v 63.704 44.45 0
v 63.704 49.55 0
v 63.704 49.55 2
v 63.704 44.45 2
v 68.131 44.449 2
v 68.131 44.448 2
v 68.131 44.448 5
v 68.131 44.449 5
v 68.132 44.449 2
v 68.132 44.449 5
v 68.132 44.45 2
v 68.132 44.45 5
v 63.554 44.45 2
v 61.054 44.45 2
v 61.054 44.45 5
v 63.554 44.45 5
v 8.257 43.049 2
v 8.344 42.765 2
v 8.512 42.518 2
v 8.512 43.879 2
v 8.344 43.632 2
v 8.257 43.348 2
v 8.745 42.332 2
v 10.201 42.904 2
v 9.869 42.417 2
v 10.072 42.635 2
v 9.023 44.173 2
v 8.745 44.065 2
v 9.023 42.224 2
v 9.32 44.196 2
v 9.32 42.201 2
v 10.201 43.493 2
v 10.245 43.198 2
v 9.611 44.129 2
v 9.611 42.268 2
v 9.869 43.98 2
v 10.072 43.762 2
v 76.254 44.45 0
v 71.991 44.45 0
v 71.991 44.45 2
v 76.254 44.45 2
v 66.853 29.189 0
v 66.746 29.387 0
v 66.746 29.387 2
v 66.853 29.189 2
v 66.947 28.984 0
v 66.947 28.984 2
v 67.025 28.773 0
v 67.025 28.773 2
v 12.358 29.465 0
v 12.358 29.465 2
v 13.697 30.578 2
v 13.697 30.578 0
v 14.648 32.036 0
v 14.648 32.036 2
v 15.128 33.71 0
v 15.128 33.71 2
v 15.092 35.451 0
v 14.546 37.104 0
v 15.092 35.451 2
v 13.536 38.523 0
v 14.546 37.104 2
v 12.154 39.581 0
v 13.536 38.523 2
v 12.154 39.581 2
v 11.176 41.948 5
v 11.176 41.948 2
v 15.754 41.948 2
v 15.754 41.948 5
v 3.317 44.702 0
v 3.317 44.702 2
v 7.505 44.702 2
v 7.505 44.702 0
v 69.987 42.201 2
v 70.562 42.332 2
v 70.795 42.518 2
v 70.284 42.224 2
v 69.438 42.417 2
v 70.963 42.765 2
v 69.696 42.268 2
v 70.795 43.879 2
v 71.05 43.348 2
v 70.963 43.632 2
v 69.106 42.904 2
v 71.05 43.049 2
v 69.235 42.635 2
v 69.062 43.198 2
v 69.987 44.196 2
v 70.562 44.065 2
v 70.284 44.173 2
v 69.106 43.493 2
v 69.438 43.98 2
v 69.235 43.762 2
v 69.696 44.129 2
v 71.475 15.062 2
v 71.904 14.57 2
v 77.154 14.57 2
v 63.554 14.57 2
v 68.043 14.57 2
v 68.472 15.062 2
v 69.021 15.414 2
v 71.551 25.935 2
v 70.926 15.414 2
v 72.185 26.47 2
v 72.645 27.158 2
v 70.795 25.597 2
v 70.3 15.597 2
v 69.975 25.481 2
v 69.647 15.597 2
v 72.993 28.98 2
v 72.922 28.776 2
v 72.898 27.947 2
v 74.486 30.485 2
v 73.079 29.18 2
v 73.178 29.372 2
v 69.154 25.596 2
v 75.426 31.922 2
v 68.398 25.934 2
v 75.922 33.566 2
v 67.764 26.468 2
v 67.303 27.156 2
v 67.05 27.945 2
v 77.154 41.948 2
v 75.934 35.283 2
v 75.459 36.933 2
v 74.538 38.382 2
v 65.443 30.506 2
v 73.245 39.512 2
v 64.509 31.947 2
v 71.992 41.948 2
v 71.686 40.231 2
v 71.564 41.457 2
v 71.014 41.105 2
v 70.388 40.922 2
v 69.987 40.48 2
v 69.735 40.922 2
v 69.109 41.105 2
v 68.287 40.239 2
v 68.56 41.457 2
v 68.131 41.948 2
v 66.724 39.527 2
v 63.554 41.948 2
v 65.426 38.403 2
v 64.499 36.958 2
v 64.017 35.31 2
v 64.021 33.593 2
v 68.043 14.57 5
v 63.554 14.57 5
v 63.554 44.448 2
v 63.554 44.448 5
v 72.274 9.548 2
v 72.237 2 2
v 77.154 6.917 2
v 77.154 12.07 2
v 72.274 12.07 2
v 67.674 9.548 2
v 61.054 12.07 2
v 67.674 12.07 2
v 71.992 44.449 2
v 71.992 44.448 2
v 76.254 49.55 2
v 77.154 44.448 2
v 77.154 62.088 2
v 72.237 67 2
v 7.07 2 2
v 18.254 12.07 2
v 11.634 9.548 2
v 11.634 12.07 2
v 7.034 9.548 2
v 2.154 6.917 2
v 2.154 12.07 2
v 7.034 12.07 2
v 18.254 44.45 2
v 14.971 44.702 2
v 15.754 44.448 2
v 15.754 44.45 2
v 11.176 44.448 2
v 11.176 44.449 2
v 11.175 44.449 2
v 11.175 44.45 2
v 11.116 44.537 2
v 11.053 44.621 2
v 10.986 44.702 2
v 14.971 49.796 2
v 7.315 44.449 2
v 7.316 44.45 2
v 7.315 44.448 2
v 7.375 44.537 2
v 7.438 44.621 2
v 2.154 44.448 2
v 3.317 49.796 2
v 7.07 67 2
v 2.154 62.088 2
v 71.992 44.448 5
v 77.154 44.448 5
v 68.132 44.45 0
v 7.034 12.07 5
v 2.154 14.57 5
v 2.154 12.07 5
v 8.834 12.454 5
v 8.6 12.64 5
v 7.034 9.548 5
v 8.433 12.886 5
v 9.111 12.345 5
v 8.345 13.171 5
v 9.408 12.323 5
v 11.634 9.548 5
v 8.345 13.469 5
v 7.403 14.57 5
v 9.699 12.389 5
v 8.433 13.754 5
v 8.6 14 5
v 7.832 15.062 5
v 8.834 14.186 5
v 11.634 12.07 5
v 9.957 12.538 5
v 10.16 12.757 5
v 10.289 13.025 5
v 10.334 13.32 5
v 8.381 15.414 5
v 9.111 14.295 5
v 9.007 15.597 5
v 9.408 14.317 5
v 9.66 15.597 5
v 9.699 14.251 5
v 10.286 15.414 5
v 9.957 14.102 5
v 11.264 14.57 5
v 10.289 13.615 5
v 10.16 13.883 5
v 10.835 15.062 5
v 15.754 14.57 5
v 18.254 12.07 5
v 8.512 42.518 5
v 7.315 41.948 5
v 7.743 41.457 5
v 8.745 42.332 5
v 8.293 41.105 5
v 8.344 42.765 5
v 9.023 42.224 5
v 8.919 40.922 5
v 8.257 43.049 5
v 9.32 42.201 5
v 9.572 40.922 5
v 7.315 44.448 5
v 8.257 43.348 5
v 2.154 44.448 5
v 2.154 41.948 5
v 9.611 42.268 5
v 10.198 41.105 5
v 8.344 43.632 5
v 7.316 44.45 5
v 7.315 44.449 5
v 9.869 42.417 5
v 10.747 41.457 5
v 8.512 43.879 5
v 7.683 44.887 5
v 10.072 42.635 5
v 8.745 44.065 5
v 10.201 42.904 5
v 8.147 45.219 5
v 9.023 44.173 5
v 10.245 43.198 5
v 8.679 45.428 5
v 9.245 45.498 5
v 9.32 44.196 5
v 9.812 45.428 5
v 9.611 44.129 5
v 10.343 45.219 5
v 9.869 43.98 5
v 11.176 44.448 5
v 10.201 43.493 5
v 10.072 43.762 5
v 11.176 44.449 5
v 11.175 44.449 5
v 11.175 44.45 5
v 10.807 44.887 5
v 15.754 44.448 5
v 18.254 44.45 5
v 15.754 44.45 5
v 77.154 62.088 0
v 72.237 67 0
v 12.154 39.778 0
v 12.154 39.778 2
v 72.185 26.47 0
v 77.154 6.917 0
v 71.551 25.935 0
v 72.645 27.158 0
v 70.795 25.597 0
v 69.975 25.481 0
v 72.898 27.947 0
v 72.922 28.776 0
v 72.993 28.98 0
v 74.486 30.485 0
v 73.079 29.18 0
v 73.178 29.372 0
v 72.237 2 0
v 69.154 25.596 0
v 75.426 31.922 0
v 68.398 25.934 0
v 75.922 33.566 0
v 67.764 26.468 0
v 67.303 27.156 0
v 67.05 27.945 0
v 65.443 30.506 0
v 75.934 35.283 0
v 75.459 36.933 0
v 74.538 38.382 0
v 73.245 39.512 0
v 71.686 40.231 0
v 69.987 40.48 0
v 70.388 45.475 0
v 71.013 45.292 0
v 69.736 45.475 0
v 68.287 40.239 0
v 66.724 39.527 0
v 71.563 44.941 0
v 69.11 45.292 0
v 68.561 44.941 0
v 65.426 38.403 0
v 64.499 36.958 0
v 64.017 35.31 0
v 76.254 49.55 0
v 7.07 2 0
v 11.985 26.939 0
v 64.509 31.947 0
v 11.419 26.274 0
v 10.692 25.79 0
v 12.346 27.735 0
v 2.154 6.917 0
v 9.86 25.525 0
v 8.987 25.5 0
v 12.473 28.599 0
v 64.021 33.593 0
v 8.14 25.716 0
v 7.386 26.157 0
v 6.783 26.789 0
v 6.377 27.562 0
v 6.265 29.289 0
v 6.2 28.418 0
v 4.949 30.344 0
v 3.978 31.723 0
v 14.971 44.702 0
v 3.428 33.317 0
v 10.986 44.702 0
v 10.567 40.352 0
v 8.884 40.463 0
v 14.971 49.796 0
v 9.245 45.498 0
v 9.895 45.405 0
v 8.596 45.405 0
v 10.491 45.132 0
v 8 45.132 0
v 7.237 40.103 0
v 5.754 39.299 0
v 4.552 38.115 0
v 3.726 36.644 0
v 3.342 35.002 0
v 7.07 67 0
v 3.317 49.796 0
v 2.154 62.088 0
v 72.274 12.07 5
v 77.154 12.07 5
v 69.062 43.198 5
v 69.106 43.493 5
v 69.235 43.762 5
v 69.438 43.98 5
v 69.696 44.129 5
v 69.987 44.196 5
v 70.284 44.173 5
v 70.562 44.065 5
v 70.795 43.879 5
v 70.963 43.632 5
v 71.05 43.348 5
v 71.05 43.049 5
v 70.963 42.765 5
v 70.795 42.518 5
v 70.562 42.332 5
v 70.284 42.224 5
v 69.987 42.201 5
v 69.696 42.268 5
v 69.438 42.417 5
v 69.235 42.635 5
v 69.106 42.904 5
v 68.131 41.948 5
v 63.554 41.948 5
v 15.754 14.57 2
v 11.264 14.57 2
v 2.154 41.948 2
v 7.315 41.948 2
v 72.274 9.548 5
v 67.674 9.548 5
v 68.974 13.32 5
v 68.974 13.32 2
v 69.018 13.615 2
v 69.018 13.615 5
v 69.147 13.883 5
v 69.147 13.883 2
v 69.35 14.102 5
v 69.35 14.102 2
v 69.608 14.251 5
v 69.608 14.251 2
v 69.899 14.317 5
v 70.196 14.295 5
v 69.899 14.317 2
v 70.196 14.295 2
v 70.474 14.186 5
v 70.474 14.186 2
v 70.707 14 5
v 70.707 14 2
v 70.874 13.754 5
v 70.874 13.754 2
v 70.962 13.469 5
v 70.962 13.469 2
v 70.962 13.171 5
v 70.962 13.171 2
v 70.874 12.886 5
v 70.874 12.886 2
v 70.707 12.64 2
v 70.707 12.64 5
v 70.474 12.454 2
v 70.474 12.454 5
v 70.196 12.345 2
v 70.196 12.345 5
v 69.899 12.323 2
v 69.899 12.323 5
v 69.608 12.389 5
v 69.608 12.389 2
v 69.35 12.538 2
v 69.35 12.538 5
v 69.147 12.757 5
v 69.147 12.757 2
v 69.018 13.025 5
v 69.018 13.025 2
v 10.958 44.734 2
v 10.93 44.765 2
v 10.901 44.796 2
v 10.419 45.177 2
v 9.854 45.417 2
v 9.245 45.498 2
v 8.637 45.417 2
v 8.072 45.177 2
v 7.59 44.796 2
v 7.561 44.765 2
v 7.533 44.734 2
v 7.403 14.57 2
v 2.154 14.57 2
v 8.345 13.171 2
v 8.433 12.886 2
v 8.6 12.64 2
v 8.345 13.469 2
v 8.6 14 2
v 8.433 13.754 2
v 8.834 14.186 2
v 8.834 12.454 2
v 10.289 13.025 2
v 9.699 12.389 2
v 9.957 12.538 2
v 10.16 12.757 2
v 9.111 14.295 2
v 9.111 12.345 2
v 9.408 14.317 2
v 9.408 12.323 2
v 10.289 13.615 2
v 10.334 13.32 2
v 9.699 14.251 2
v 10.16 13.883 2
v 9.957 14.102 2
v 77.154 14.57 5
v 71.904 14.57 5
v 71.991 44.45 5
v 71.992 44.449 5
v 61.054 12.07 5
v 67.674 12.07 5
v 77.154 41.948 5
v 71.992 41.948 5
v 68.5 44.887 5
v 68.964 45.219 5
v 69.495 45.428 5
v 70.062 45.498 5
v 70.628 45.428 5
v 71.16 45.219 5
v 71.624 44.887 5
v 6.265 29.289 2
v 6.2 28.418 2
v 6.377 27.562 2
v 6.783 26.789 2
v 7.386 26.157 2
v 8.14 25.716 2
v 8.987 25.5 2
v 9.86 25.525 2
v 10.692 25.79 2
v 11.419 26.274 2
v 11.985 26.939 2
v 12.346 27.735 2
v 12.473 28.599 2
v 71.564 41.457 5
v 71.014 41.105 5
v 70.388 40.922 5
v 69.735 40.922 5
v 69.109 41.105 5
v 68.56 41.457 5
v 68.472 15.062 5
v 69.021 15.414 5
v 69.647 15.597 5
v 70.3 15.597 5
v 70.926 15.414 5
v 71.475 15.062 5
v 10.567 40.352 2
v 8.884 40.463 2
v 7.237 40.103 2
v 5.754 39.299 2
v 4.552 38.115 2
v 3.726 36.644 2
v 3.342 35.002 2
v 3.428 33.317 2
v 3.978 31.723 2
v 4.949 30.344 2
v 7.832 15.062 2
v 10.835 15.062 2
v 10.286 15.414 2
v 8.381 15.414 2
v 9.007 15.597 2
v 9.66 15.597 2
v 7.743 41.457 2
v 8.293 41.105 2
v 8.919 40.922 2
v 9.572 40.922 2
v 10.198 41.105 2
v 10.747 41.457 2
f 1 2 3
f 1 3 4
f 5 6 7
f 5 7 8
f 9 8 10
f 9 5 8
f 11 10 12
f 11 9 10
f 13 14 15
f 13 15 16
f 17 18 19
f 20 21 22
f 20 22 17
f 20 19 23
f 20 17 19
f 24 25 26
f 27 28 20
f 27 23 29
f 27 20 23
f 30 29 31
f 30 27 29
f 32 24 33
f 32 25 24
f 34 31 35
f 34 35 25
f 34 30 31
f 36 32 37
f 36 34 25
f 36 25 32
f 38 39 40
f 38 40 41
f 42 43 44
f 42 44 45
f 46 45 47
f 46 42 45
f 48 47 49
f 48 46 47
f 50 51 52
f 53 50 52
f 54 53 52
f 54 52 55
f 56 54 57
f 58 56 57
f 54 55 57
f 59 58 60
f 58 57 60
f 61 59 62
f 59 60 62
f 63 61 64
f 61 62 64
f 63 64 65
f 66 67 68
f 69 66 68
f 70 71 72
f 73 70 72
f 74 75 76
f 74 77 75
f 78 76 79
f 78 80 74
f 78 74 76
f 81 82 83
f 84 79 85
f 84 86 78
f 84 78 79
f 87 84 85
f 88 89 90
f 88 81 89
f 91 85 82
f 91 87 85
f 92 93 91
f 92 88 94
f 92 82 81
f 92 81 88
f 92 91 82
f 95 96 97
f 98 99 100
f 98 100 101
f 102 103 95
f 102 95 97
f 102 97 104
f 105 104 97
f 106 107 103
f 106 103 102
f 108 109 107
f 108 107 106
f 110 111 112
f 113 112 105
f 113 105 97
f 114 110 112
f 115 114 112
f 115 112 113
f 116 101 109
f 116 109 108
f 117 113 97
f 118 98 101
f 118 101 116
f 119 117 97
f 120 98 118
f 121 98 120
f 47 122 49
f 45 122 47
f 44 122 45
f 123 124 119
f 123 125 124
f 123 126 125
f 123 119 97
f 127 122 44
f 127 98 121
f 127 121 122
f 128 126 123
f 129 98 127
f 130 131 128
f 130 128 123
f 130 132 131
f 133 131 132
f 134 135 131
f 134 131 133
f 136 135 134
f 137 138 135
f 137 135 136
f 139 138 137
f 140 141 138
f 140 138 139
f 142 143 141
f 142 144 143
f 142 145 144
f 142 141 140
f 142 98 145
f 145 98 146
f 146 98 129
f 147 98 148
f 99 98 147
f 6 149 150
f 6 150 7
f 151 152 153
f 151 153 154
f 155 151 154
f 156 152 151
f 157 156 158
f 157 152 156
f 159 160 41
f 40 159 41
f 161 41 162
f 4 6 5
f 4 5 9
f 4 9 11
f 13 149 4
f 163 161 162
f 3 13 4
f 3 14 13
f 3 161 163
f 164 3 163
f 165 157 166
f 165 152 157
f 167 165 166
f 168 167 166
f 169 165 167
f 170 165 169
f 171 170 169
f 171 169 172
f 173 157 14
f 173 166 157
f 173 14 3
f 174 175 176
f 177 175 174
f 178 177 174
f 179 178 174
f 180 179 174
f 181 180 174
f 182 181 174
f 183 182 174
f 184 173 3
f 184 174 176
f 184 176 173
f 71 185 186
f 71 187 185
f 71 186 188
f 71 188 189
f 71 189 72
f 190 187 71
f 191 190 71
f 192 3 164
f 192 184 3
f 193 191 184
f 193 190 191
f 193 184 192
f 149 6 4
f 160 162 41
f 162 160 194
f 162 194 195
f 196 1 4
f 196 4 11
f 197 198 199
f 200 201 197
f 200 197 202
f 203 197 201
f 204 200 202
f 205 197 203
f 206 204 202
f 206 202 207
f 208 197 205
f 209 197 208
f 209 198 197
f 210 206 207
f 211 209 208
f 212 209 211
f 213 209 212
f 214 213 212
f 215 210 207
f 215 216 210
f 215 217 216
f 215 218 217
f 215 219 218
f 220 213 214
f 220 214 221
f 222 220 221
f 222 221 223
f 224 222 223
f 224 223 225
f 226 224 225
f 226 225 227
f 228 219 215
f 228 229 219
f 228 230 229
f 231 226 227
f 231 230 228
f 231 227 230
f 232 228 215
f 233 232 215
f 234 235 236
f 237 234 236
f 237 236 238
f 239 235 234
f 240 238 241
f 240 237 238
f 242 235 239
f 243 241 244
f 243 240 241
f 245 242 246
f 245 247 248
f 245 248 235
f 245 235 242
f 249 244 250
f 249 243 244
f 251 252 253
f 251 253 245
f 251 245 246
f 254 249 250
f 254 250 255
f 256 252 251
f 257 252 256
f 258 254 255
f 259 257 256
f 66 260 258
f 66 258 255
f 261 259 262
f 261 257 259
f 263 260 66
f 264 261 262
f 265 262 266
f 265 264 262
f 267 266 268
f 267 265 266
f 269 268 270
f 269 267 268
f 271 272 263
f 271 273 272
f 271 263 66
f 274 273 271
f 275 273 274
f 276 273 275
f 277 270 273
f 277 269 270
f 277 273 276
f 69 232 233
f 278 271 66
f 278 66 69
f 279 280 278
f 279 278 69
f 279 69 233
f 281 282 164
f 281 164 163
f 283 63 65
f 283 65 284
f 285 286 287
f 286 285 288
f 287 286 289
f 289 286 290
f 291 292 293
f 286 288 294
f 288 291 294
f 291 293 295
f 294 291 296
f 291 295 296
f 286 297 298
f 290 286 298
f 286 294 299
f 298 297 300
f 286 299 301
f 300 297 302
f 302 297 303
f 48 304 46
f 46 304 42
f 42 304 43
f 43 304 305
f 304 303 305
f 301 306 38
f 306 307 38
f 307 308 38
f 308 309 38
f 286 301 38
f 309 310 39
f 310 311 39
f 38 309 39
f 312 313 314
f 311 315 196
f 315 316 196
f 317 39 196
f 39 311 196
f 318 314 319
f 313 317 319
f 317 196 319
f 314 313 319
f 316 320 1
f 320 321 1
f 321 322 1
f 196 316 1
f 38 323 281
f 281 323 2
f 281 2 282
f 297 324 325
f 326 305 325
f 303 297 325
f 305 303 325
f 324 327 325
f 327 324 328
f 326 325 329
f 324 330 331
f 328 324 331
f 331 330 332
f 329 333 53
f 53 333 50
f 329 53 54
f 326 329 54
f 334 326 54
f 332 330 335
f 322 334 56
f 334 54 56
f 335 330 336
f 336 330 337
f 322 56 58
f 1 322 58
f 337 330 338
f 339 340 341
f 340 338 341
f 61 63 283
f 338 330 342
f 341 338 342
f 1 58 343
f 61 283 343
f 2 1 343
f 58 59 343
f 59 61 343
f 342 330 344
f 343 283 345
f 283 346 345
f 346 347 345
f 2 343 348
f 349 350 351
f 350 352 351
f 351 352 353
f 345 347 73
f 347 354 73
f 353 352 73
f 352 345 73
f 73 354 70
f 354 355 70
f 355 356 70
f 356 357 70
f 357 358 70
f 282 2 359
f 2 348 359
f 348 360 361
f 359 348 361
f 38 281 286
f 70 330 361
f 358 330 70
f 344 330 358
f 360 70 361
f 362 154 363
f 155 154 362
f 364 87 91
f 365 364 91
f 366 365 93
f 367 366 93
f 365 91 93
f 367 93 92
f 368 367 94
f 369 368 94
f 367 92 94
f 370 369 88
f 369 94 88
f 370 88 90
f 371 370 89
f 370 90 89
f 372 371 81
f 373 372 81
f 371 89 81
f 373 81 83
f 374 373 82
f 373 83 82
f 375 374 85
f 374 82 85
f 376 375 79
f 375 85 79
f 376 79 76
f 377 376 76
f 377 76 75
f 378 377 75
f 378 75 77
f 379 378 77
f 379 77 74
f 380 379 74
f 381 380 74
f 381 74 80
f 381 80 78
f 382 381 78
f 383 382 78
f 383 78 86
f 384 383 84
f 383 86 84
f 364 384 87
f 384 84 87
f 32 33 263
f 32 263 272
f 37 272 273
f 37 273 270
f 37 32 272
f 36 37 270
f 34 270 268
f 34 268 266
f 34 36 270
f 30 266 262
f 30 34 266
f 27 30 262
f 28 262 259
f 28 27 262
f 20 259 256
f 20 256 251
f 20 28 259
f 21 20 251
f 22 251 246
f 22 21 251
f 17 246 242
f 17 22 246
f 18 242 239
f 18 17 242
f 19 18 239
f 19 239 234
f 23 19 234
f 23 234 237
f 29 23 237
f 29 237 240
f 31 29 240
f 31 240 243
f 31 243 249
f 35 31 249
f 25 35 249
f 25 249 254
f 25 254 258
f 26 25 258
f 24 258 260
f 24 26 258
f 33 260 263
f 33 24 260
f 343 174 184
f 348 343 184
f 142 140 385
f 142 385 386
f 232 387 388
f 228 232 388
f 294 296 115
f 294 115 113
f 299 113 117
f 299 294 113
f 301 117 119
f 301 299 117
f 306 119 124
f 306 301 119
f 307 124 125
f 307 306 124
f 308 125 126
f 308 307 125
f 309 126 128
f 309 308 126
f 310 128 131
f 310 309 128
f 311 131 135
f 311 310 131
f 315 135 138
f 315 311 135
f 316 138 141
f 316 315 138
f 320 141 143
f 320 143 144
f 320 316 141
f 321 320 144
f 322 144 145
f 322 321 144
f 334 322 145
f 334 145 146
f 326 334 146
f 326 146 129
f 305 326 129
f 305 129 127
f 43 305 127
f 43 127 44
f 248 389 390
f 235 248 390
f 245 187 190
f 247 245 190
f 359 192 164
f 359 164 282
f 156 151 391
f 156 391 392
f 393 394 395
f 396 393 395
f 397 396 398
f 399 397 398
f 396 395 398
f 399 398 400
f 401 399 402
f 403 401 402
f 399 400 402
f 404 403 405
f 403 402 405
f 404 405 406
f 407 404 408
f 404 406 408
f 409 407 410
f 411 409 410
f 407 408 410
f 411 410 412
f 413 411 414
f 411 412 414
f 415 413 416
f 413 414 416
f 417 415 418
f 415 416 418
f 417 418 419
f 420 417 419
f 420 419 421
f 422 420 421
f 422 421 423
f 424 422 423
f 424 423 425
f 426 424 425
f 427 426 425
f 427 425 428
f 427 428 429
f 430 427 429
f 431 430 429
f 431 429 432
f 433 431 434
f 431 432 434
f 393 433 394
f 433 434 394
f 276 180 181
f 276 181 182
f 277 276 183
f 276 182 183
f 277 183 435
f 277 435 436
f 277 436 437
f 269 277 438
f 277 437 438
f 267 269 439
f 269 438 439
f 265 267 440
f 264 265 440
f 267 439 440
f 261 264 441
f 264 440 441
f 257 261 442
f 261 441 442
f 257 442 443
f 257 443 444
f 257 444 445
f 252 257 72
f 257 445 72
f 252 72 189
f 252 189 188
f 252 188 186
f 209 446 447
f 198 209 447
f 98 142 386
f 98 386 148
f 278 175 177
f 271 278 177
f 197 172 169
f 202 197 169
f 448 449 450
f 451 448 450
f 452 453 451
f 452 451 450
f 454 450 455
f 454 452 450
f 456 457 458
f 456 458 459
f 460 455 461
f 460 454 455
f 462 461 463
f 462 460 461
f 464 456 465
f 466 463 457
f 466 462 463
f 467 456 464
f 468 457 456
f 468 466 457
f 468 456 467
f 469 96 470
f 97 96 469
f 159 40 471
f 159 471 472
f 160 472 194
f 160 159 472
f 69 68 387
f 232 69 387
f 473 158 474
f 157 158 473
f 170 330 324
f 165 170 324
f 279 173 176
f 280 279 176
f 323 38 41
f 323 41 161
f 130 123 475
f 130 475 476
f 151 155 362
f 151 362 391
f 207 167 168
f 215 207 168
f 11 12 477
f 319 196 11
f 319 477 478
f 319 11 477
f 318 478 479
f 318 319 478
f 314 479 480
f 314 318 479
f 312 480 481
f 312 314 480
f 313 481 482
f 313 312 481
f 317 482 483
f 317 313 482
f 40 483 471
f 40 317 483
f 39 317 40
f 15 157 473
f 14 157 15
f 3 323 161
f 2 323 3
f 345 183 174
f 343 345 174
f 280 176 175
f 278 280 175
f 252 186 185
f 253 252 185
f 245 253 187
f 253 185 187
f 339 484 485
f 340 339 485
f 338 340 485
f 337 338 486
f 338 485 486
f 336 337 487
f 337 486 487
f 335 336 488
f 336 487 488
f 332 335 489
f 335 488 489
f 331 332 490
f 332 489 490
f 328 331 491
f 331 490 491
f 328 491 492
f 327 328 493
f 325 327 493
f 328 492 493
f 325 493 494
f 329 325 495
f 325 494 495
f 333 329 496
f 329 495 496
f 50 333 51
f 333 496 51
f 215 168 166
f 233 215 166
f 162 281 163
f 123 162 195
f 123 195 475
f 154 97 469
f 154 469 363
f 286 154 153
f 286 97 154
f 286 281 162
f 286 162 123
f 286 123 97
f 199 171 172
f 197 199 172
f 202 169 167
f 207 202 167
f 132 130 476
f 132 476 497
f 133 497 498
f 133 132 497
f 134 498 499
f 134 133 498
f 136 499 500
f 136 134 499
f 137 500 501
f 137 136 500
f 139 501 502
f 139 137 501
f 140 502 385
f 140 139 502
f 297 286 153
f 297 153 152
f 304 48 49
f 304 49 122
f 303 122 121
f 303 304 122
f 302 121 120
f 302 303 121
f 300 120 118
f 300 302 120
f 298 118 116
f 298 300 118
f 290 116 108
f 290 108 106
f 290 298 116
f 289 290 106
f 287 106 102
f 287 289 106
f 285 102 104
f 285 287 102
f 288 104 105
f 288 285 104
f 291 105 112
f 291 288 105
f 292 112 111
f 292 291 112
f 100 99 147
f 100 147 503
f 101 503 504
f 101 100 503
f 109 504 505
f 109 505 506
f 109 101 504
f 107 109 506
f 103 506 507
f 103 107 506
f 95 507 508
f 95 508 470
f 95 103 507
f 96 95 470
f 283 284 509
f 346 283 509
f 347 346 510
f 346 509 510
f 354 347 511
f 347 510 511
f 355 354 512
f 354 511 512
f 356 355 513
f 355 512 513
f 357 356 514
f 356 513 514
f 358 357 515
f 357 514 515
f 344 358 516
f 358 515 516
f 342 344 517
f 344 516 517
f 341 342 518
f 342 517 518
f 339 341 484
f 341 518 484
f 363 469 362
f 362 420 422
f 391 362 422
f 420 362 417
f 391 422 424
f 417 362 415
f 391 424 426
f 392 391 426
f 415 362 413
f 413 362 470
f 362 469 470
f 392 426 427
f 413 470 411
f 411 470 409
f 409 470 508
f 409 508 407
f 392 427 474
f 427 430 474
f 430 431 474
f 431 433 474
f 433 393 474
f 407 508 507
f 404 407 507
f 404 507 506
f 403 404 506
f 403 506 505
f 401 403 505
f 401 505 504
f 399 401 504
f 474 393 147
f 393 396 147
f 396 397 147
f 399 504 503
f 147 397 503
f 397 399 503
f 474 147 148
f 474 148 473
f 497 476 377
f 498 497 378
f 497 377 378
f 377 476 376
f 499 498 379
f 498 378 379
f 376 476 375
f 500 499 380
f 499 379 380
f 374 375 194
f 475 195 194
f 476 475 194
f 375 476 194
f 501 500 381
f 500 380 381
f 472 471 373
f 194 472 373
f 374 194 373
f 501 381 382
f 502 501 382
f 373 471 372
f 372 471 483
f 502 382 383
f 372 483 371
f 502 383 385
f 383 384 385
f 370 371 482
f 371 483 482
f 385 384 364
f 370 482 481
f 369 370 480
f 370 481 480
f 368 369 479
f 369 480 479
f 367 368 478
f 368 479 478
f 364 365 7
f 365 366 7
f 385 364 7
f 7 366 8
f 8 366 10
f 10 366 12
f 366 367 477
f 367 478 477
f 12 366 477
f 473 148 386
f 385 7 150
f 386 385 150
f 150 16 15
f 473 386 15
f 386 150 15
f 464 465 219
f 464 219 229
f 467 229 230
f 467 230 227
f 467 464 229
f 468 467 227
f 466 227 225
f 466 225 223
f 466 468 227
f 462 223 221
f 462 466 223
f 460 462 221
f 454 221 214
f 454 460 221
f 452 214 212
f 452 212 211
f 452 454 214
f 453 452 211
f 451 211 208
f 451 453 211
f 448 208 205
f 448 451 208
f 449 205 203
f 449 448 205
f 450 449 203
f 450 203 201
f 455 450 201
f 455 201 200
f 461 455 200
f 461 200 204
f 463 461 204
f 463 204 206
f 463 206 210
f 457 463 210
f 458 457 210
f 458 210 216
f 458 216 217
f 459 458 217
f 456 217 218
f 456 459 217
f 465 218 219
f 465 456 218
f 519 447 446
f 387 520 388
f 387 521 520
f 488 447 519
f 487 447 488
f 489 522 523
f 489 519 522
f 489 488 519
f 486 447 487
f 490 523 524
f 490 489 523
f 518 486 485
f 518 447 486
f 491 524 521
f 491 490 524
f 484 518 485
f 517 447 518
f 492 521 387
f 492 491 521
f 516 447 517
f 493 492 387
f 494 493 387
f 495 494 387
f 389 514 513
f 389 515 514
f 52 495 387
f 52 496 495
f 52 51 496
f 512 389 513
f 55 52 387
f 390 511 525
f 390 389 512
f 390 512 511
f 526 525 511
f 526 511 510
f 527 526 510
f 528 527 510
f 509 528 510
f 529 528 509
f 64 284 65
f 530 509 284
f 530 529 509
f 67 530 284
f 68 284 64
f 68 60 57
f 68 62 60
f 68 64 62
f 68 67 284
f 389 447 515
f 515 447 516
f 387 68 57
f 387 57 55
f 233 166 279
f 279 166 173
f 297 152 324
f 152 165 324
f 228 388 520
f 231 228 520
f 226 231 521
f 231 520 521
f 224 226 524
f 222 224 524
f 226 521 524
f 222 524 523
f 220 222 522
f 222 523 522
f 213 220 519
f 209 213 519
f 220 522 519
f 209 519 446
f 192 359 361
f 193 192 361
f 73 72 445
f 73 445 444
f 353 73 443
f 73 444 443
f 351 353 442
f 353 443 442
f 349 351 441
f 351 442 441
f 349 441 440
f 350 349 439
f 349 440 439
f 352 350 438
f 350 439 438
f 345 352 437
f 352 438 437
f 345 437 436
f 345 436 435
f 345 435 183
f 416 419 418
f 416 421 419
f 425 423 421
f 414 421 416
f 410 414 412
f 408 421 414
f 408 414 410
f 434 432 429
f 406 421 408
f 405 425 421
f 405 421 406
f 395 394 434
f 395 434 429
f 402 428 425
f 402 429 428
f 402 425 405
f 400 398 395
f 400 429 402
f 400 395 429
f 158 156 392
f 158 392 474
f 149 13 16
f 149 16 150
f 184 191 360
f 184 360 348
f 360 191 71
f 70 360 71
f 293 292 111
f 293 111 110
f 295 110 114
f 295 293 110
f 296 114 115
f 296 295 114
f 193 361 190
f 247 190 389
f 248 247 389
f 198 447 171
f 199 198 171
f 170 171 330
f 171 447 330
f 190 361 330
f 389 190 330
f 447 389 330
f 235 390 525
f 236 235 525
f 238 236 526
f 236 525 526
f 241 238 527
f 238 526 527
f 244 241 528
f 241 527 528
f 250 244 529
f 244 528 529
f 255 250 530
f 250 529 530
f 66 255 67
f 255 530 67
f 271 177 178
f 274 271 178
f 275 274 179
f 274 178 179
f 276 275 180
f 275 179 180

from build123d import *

# Parameters (mm, degrees)
BOSS_EXTRUDE3_DEPTH = 2
SKETCH7_R           = 1
SKETCH7_W           = 2.5
SKETCH7_H           = 2.5
BOSS_EXTRUDE5_DEPTH = 3
SKETCH15_R          = 6.016109345
SKETCH15_R_2        = 2.966709341
CUT_EXTRUDE5_DEPTH  = 3
CUT_EXTRUDE6_DEPTH  = 3
CUT_EXTRUDE7_DEPTH  = 10
SKETCH30_W          = 2
SKETCH30_H          = 65
BOSS_EXTRUDE6_DEPTH = 5
SKETCH31_R          = 3.139995771
SKETCH31_R_2        = 5.842822915
CUT_EXTRUDE8_DEPTH  = 5
SKETCH33_W          = 2.81704287
SKETCH33_H          = 5.093792668
CUT_EXTRUDE9_DEPTH  = 5


with BuildPart() as part:
    # Sketch2 → Boss-Extrude3 (new body)
    with BuildSketch(Plane.XY):
        Polygon((62.078732257, 67), (7.070378023, 67), (2.153513577, 62.087886246), (2.153513577, 6.916864445), (7.070378023, 2), (62.078732257, 2), (67.153513577, 7.083274694), (67.153513577, 61.921636784), align=None)
        with BuildLine():
            ThreePointArc((12.561398281, 29.386897281), (12.405099811, 29.087669445), (12.28230409, 28.773205265))
            ThreePointArc((12.28230409, 28.773205265), (9.332354964, 25.48092154), (6.384978263, 28.775508397))
            ThreePointArc((6.384978263, 28.775508397), (6.272687262, 29.080787813), (6.128559615, 29.372390302))
            ThreePointArc((6.128559615, 29.372390302), (9.319946418, 40.479834047), (12.561398281, 29.386897281))
        make_face(mode=Mode.SUBTRACT)
        with BuildLine():
            Line((7.315683042, 44.45), (3.053513577, 44.45))
            Line((3.053513577, 44.45), (3.053513577, 49.55))
            Line((3.053513577, 49.55), (15.603513577, 49.55))
            Line((15.603513577, 49.55), (15.603513577, 44.45))
            Line((15.603513577, 44.45), (11.175073004, 44.45))
            ThreePointArc((11.175073004, 44.45), (9.245378023, 45.49849), (7.315683042, 44.45))
        make_face(mode=Mode.SUBTRACT)
    boss_extrude3 = extrude(amount=BOSS_EXTRUDE3_DEPTH)

    # Sketch7 → Boss-Extrude5 (add)
    with BuildSketch(Plane.XY.offset(2)):
        with BuildLine():
            Line((15.753513577, 14.57), (11.264187035, 14.57))
            ThreePointArc((11.264187035, 14.57), (9.333513577, 15.62), (7.40284012, 14.57))
            Line((7.40284012, 14.57), (2.153513577, 14.57))
            Line((2.153513577, 14.57), (2.153513577, 12.07))
            Line((2.153513577, 12.07), (7.033513577, 12.07))
            Line((7.033513577, 12.07), (7.40284012, 12.07))
            ThreePointArc((7.40284012, 12.07), (9.333513577, 11.02), (11.264187035, 12.07))
            Line((11.264187035, 12.07), (11.633513577, 12.07))
            Line((11.633513577, 12.07), (15.753513577, 12.07))
            Line((15.753513577, 12.07), (15.753513577, 14.57))
        make_face()
        with Locations((9.333513577, 13.32)):
            Circle(SKETCH7_R, mode=Mode.SUBTRACT)
        with BuildLine():
            Line((11.633513577, 9.547776159), (11.633513577, 12.07))
            Line((11.633513577, 12.07), (11.264187035, 12.07))
            ThreePointArc((11.264187035, 12.07), (9.333513577, 11.02), (7.40284012, 12.07))
            Line((7.40284012, 12.07), (7.033513577, 12.07))
            Line((7.033513577, 12.07), (7.033513577, 9.547776159))
            Line((7.033513577, 9.547776159), (11.633513577, 9.547776159))
        make_face()
        with Locations((17.003513577, 13.32)):
            Rectangle(SKETCH7_W, SKETCH7_H)
        with BuildLine():
            Line((15.753513577, 16.534568208), (15.753513577, 14.57))
            Line((15.753513577, 14.57), (18.253513577, 14.57))
            Line((18.253513577, 14.57), (18.253513577, 16.534568208))
            Line((18.253513577, 16.534568208), (18.253513577, 44.45))
            Line((18.253513577, 44.45), (15.753513577, 44.45))
            Line((15.753513577, 44.45), (15.753513577, 44.44849))
            Line((15.753513577, 44.44849), (11.17605148, 44.44849))
            ThreePointArc((11.17605148, 44.44849), (11.17556239, 44.449245096), (11.175073004, 44.45))
            ThreePointArc((11.175073004, 44.45), (10.343450652, 45.219439406), (9.245378023, 45.49849))
            ThreePointArc((9.245378023, 45.49849), (8.147305393, 45.219439406), (7.315683042, 44.45))
            ThreePointArc((7.315683042, 44.45), (7.315193656, 44.449245096), (7.314704565, 44.44849))
            Line((7.314704565, 44.44849), (2.153513577, 44.44849))
            Line((2.153513577, 44.44849), (2.153513577, 41.94849))
            Line((2.153513577, 41.94849), (7.314704565, 41.94849))
            ThreePointArc((7.314704565, 41.94849), (9.245378023, 40.89849), (11.17605148, 41.94849))
            Line((11.17605148, 41.94849), (15.753513577, 41.94849))
            Line((15.753513577, 41.94849), (15.753513577, 16.534568208))
        make_face()
        with Locations((9.245378023, 43.19849)):
            Circle(SKETCH7_R, mode=Mode.SUBTRACT)
    boss_extrude5 = extrude(amount=BOSS_EXTRUDE5_DEPTH)

    # Mirror4: Boss-Extrude3, Boss-Extrude5 across plane
    add(boss_extrude3.mirror(Plane.ZY.offset(-34.653513577)))
    add(boss_extrude5.mirror(Plane.ZY.offset(-34.653513577)))

    # Sketch15 → Cut-Extrude5 (cut)
    with BuildSketch(Plane.XY.offset(2)):
        with Locations((9.333513577, 34.46374)):
            Circle(SKETCH15_R)
        with Locations((9.333513577, 28.447630655)):
            Circle(SKETCH15_R_2)
    cut_extrude5 = extrude(amount=-CUT_EXTRUDE5_DEPTH, mode=Mode.SUBTRACT)

    # Sketch21 → Cut-Extrude6 (cut)
    with BuildSketch(Plane.XY.offset(2)):
        with BuildLine():
            Line((3.317404233, 44.701735967), (7.504616246, 44.701735967))
            ThreePointArc((7.504616246, 44.701735967), (9.245378023, 45.49849), (10.986139799, 44.701735967))
            Line((10.986139799, 44.701735967), (15.349622922, 44.701735967))
            Line((15.349622922, 44.701735967), (15.349622922, 49.701735967))
            Line((15.349622922, 49.701735967), (3.317404233, 49.701735967))
            Line((3.317404233, 49.701735967), (3.317404233, 44.701735967))
        make_face()
    extrude(amount=-CUT_EXTRUDE6_DEPTH, mode=Mode.SUBTRACT)

    # Sketch29 → Cut-Extrude7 (cut)
    with BuildSketch(Plane.XY.offset(2)):
        with BuildLine():
            Line((3.317404233, 44.795528635), (7.590244313, 44.795528635))
            ThreePointArc((7.590244313, 44.795528635), (9.245378023, 45.49849), (10.900511733, 44.795528635))
            Line((10.900511733, 44.795528635), (15.349622922, 44.795528635))
            Line((15.349622922, 44.795528635), (15.349622922, 49.795528635))
            Line((15.349622922, 49.795528635), (3.317404233, 49.795528635))
            Line((3.317404233, 49.795528635), (3.317404233, 44.795528635))
        make_face()
    cut_extrude7 = extrude(amount=-CUT_EXTRUDE7_DEPTH, mode=Mode.SUBTRACT)

    # Mirror9: Cut-Extrude7 across plane
    add(cut_extrude7.mirror(Plane.ZY.offset(-34.653513577)), mode=Mode.SUBTRACT)

    # Mirror5: Cut-Extrude5 across plane
    add(cut_extrude5.mirror(Plane.ZY.offset(-34.653513577)), mode=Mode.SUBTRACT)

    # SurfaceCut1
    split(bisect_by=Plane.ZY.offset(-34.653513577), keep=Keep.TOP)

    # Sketch30 → Boss-Extrude6 (add)
    with BuildSketch(Plane(origin=(34.653513577, 0, 0), x_dir=(0, 0, -1), z_dir=(1, 0, 0))):
        with Locations((-1, 34.5)):
            Rectangle(SKETCH30_W, SKETCH30_H)
    extrude(amount=BOSS_EXTRUDE6_DEPTH)

    # Mirror12: Boss-Extrude3, Boss-Extrude5 across plane
    add(boss_extrude3.mirror(Plane(origin=(39.653513577, 0, 0), x_dir=(0, 0, 1), z_dir=(1, 0, 0))))
    add(boss_extrude5.mirror(Plane(origin=(39.653513577, 0, 0), x_dir=(0, 0, 1), z_dir=(1, 0, 0))))

    # Sketch31 → Cut-Extrude8 (cut)
    with BuildSketch(Plane.XY.offset(2)):
        with Locations((9.333513577, 28.620917085)):
            Circle(SKETCH31_R)
        with Locations((9.333513577, 34.46374)):
            Circle(SKETCH31_R_2)
    extrude(amount=-CUT_EXTRUDE8_DEPTH, mode=Mode.SUBTRACT)

    # Sketch33 → Cut-Extrude9 (cut)
    with BuildSketch(Plane.XY.offset(2)):
        with Locations((13.562035012, 47.248632301)):
            Rectangle(SKETCH33_W, SKETCH33_H)
    extrude(amount=-CUT_EXTRUDE9_DEPTH, mode=Mode.SUBTRACT)


solid = part.part
